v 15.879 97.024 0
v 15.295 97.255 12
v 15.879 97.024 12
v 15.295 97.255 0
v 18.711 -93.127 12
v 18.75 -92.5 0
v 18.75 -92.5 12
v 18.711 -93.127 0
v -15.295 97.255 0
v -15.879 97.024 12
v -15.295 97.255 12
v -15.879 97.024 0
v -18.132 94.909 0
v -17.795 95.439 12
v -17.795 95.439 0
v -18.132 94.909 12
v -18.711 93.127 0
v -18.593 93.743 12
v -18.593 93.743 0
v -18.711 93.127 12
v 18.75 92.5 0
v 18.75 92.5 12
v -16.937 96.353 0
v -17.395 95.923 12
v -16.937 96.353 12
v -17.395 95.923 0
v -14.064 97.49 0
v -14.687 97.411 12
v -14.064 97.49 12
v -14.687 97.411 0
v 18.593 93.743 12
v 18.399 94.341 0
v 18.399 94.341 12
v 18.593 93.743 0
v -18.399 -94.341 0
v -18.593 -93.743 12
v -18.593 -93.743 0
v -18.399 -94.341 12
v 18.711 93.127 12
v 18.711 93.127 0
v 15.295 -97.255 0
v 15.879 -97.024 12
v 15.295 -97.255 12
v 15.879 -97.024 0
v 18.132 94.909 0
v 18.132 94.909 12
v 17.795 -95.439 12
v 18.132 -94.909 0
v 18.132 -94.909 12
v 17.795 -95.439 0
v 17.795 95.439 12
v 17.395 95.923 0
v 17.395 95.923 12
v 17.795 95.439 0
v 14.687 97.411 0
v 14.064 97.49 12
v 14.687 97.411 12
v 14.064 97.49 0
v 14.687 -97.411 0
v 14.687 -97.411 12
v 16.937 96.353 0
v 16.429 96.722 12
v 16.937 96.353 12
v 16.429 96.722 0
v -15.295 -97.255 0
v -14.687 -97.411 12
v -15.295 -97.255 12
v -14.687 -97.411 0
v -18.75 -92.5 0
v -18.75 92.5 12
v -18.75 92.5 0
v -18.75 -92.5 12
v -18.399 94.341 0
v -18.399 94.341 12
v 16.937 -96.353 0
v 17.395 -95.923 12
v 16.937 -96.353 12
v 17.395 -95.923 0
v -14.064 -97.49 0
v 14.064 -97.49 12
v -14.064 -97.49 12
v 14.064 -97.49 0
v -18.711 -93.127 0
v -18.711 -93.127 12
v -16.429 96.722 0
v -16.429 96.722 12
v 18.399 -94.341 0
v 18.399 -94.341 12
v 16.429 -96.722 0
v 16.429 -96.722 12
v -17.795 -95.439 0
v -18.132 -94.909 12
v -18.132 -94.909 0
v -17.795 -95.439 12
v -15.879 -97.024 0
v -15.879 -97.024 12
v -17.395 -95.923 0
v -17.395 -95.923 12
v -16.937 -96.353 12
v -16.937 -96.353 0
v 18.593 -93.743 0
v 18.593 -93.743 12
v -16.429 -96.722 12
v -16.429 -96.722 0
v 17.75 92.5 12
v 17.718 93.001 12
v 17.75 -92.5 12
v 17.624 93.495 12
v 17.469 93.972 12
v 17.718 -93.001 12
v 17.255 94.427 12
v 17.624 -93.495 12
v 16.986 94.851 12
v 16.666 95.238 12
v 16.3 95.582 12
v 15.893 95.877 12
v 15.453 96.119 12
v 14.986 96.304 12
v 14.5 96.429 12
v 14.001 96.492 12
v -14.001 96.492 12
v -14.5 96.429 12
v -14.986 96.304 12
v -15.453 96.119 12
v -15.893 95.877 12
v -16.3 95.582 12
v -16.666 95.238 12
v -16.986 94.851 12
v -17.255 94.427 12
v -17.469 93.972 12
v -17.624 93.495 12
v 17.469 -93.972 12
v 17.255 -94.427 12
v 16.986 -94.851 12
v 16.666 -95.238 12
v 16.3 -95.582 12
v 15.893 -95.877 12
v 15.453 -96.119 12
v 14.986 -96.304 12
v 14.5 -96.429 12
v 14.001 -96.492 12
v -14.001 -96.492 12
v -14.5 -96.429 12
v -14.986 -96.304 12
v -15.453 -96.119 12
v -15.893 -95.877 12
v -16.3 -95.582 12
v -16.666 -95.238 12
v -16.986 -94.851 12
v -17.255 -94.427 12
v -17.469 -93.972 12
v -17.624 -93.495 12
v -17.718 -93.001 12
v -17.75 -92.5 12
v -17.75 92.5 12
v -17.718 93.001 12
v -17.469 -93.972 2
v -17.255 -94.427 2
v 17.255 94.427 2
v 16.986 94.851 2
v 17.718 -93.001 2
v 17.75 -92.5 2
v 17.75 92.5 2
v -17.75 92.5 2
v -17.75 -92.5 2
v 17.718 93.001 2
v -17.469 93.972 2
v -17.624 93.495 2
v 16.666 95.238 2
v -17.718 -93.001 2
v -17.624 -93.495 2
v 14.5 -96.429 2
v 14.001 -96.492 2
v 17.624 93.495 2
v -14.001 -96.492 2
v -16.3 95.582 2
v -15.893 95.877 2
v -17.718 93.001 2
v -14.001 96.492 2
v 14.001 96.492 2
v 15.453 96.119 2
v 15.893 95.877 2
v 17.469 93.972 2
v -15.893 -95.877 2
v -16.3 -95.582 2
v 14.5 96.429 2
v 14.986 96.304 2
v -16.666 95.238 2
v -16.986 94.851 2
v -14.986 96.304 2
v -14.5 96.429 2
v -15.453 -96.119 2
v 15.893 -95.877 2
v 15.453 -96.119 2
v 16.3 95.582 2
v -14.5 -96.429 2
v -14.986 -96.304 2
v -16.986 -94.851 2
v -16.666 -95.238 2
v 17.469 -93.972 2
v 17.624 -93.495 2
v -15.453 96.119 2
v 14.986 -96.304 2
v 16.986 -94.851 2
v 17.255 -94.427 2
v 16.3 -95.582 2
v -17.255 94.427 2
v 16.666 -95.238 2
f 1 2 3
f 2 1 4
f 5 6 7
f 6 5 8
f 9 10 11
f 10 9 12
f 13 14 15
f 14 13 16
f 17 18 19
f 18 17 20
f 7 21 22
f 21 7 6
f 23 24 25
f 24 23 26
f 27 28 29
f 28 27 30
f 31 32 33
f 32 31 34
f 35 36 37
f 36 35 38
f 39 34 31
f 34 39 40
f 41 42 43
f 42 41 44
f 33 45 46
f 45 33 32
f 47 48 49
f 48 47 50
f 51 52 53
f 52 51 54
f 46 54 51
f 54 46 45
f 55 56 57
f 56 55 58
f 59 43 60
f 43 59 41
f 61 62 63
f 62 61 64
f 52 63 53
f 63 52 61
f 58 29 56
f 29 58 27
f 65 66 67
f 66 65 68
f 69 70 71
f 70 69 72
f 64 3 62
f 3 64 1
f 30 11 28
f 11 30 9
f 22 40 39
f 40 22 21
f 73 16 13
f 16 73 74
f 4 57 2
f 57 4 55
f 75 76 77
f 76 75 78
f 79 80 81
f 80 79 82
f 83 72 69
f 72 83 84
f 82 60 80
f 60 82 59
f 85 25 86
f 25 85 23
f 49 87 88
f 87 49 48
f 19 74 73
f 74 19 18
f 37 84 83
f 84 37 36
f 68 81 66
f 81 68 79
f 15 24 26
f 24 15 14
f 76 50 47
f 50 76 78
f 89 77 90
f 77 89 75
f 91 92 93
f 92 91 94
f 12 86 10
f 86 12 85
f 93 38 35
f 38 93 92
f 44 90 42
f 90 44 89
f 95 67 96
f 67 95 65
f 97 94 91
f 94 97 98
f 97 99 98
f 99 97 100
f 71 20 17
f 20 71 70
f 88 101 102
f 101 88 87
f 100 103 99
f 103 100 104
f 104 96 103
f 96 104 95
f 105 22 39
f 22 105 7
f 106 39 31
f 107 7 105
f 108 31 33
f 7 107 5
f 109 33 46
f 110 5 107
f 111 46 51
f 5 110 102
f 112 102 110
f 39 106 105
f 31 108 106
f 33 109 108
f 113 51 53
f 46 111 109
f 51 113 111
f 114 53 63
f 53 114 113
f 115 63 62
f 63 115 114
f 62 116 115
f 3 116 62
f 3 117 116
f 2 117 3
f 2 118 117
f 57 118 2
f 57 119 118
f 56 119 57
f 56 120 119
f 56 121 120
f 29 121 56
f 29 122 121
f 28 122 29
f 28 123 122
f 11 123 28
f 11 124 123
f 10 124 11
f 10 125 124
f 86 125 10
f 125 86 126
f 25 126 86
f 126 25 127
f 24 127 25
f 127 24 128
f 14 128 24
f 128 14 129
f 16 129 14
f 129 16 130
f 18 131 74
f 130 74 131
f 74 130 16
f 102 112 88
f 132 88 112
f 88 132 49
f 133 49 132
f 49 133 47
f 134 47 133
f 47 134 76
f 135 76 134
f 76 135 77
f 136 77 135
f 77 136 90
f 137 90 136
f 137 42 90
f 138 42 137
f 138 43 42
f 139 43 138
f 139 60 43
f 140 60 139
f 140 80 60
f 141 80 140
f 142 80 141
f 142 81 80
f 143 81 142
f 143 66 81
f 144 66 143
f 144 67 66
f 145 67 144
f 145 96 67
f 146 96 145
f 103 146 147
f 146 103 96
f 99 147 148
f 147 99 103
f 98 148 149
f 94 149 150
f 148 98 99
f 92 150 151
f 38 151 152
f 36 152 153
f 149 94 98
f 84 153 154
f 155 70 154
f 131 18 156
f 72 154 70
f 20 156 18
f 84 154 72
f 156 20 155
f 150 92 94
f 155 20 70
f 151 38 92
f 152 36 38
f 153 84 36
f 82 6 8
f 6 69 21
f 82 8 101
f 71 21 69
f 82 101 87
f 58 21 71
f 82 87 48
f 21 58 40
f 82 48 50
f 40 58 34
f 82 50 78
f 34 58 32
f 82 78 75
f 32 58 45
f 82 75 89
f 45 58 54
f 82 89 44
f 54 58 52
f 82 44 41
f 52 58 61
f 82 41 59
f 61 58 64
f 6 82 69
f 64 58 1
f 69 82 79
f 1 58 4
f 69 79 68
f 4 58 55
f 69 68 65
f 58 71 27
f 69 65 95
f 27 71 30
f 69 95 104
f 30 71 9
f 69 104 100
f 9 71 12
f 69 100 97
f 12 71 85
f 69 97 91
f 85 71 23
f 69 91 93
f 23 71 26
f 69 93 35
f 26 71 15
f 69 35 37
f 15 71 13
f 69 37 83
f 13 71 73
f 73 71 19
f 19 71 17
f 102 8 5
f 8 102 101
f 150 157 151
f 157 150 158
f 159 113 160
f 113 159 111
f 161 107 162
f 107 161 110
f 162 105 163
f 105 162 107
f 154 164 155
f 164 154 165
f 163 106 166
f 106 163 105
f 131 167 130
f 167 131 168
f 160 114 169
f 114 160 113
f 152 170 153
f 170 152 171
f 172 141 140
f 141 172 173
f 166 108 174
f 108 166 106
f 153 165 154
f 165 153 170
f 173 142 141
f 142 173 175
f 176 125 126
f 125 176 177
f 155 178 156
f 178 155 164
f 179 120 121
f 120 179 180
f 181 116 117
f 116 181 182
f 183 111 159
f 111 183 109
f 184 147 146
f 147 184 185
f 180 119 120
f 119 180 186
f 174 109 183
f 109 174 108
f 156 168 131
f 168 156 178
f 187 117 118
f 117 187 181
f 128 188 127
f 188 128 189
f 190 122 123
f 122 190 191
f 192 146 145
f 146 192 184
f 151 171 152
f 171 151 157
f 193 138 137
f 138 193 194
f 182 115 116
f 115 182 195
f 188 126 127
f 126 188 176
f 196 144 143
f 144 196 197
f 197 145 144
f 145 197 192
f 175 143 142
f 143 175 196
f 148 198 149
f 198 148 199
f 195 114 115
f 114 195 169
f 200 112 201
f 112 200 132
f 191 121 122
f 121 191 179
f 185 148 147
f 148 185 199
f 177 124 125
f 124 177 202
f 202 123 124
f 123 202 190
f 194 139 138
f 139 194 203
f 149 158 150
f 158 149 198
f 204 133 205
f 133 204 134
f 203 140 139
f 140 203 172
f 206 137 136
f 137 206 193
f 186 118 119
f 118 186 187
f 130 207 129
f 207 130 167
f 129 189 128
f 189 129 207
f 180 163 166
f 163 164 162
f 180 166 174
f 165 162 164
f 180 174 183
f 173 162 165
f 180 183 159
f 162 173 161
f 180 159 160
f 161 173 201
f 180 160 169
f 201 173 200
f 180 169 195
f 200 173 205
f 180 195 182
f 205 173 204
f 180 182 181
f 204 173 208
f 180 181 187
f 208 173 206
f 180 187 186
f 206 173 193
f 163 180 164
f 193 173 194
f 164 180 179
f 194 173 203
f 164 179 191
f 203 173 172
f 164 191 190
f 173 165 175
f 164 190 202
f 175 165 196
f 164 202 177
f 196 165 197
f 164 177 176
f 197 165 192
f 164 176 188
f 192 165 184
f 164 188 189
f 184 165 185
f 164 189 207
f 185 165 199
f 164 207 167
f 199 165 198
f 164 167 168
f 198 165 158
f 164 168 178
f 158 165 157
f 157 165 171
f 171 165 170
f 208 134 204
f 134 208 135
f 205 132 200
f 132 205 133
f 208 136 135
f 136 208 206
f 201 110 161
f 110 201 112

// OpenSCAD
$fn = 50;


difference() {
	union() {
		hull() {
			translate(v = [-13.7500000000, 92.5000000000, 0]) {
				cylinder(h = 12, r = 5);
			}
			translate(v = [13.7500000000, 92.5000000000, 0]) {
				cylinder(h = 12, r = 5);
			}
			translate(v = [-13.7500000000, -92.5000000000, 0]) {
				cylinder(h = 12, r = 5);
			}
			translate(v = [13.7500000000, -92.5000000000, 0]) {
				cylinder(h = 12, r = 5);
			}
		}
	}
	union() {
		translate(v = [0, 0, 2]) {
			hull() {
				translate(v = [-13.7500000000, 92.5000000000, 0]) {
					cylinder(h = 10, r = 4);
				}
				translate(v = [13.7500000000, 92.5000000000, 0]) {
					cylinder(h = 10, r = 4);
				}
				translate(v = [-13.7500000000, -92.5000000000, 0]) {
					cylinder(h = 10, r = 4);
				}
				translate(v = [13.7500000000, -92.5000000000, 0]) {
					cylinder(h = 10, r = 4);
				}
			}
		}
	}
}
